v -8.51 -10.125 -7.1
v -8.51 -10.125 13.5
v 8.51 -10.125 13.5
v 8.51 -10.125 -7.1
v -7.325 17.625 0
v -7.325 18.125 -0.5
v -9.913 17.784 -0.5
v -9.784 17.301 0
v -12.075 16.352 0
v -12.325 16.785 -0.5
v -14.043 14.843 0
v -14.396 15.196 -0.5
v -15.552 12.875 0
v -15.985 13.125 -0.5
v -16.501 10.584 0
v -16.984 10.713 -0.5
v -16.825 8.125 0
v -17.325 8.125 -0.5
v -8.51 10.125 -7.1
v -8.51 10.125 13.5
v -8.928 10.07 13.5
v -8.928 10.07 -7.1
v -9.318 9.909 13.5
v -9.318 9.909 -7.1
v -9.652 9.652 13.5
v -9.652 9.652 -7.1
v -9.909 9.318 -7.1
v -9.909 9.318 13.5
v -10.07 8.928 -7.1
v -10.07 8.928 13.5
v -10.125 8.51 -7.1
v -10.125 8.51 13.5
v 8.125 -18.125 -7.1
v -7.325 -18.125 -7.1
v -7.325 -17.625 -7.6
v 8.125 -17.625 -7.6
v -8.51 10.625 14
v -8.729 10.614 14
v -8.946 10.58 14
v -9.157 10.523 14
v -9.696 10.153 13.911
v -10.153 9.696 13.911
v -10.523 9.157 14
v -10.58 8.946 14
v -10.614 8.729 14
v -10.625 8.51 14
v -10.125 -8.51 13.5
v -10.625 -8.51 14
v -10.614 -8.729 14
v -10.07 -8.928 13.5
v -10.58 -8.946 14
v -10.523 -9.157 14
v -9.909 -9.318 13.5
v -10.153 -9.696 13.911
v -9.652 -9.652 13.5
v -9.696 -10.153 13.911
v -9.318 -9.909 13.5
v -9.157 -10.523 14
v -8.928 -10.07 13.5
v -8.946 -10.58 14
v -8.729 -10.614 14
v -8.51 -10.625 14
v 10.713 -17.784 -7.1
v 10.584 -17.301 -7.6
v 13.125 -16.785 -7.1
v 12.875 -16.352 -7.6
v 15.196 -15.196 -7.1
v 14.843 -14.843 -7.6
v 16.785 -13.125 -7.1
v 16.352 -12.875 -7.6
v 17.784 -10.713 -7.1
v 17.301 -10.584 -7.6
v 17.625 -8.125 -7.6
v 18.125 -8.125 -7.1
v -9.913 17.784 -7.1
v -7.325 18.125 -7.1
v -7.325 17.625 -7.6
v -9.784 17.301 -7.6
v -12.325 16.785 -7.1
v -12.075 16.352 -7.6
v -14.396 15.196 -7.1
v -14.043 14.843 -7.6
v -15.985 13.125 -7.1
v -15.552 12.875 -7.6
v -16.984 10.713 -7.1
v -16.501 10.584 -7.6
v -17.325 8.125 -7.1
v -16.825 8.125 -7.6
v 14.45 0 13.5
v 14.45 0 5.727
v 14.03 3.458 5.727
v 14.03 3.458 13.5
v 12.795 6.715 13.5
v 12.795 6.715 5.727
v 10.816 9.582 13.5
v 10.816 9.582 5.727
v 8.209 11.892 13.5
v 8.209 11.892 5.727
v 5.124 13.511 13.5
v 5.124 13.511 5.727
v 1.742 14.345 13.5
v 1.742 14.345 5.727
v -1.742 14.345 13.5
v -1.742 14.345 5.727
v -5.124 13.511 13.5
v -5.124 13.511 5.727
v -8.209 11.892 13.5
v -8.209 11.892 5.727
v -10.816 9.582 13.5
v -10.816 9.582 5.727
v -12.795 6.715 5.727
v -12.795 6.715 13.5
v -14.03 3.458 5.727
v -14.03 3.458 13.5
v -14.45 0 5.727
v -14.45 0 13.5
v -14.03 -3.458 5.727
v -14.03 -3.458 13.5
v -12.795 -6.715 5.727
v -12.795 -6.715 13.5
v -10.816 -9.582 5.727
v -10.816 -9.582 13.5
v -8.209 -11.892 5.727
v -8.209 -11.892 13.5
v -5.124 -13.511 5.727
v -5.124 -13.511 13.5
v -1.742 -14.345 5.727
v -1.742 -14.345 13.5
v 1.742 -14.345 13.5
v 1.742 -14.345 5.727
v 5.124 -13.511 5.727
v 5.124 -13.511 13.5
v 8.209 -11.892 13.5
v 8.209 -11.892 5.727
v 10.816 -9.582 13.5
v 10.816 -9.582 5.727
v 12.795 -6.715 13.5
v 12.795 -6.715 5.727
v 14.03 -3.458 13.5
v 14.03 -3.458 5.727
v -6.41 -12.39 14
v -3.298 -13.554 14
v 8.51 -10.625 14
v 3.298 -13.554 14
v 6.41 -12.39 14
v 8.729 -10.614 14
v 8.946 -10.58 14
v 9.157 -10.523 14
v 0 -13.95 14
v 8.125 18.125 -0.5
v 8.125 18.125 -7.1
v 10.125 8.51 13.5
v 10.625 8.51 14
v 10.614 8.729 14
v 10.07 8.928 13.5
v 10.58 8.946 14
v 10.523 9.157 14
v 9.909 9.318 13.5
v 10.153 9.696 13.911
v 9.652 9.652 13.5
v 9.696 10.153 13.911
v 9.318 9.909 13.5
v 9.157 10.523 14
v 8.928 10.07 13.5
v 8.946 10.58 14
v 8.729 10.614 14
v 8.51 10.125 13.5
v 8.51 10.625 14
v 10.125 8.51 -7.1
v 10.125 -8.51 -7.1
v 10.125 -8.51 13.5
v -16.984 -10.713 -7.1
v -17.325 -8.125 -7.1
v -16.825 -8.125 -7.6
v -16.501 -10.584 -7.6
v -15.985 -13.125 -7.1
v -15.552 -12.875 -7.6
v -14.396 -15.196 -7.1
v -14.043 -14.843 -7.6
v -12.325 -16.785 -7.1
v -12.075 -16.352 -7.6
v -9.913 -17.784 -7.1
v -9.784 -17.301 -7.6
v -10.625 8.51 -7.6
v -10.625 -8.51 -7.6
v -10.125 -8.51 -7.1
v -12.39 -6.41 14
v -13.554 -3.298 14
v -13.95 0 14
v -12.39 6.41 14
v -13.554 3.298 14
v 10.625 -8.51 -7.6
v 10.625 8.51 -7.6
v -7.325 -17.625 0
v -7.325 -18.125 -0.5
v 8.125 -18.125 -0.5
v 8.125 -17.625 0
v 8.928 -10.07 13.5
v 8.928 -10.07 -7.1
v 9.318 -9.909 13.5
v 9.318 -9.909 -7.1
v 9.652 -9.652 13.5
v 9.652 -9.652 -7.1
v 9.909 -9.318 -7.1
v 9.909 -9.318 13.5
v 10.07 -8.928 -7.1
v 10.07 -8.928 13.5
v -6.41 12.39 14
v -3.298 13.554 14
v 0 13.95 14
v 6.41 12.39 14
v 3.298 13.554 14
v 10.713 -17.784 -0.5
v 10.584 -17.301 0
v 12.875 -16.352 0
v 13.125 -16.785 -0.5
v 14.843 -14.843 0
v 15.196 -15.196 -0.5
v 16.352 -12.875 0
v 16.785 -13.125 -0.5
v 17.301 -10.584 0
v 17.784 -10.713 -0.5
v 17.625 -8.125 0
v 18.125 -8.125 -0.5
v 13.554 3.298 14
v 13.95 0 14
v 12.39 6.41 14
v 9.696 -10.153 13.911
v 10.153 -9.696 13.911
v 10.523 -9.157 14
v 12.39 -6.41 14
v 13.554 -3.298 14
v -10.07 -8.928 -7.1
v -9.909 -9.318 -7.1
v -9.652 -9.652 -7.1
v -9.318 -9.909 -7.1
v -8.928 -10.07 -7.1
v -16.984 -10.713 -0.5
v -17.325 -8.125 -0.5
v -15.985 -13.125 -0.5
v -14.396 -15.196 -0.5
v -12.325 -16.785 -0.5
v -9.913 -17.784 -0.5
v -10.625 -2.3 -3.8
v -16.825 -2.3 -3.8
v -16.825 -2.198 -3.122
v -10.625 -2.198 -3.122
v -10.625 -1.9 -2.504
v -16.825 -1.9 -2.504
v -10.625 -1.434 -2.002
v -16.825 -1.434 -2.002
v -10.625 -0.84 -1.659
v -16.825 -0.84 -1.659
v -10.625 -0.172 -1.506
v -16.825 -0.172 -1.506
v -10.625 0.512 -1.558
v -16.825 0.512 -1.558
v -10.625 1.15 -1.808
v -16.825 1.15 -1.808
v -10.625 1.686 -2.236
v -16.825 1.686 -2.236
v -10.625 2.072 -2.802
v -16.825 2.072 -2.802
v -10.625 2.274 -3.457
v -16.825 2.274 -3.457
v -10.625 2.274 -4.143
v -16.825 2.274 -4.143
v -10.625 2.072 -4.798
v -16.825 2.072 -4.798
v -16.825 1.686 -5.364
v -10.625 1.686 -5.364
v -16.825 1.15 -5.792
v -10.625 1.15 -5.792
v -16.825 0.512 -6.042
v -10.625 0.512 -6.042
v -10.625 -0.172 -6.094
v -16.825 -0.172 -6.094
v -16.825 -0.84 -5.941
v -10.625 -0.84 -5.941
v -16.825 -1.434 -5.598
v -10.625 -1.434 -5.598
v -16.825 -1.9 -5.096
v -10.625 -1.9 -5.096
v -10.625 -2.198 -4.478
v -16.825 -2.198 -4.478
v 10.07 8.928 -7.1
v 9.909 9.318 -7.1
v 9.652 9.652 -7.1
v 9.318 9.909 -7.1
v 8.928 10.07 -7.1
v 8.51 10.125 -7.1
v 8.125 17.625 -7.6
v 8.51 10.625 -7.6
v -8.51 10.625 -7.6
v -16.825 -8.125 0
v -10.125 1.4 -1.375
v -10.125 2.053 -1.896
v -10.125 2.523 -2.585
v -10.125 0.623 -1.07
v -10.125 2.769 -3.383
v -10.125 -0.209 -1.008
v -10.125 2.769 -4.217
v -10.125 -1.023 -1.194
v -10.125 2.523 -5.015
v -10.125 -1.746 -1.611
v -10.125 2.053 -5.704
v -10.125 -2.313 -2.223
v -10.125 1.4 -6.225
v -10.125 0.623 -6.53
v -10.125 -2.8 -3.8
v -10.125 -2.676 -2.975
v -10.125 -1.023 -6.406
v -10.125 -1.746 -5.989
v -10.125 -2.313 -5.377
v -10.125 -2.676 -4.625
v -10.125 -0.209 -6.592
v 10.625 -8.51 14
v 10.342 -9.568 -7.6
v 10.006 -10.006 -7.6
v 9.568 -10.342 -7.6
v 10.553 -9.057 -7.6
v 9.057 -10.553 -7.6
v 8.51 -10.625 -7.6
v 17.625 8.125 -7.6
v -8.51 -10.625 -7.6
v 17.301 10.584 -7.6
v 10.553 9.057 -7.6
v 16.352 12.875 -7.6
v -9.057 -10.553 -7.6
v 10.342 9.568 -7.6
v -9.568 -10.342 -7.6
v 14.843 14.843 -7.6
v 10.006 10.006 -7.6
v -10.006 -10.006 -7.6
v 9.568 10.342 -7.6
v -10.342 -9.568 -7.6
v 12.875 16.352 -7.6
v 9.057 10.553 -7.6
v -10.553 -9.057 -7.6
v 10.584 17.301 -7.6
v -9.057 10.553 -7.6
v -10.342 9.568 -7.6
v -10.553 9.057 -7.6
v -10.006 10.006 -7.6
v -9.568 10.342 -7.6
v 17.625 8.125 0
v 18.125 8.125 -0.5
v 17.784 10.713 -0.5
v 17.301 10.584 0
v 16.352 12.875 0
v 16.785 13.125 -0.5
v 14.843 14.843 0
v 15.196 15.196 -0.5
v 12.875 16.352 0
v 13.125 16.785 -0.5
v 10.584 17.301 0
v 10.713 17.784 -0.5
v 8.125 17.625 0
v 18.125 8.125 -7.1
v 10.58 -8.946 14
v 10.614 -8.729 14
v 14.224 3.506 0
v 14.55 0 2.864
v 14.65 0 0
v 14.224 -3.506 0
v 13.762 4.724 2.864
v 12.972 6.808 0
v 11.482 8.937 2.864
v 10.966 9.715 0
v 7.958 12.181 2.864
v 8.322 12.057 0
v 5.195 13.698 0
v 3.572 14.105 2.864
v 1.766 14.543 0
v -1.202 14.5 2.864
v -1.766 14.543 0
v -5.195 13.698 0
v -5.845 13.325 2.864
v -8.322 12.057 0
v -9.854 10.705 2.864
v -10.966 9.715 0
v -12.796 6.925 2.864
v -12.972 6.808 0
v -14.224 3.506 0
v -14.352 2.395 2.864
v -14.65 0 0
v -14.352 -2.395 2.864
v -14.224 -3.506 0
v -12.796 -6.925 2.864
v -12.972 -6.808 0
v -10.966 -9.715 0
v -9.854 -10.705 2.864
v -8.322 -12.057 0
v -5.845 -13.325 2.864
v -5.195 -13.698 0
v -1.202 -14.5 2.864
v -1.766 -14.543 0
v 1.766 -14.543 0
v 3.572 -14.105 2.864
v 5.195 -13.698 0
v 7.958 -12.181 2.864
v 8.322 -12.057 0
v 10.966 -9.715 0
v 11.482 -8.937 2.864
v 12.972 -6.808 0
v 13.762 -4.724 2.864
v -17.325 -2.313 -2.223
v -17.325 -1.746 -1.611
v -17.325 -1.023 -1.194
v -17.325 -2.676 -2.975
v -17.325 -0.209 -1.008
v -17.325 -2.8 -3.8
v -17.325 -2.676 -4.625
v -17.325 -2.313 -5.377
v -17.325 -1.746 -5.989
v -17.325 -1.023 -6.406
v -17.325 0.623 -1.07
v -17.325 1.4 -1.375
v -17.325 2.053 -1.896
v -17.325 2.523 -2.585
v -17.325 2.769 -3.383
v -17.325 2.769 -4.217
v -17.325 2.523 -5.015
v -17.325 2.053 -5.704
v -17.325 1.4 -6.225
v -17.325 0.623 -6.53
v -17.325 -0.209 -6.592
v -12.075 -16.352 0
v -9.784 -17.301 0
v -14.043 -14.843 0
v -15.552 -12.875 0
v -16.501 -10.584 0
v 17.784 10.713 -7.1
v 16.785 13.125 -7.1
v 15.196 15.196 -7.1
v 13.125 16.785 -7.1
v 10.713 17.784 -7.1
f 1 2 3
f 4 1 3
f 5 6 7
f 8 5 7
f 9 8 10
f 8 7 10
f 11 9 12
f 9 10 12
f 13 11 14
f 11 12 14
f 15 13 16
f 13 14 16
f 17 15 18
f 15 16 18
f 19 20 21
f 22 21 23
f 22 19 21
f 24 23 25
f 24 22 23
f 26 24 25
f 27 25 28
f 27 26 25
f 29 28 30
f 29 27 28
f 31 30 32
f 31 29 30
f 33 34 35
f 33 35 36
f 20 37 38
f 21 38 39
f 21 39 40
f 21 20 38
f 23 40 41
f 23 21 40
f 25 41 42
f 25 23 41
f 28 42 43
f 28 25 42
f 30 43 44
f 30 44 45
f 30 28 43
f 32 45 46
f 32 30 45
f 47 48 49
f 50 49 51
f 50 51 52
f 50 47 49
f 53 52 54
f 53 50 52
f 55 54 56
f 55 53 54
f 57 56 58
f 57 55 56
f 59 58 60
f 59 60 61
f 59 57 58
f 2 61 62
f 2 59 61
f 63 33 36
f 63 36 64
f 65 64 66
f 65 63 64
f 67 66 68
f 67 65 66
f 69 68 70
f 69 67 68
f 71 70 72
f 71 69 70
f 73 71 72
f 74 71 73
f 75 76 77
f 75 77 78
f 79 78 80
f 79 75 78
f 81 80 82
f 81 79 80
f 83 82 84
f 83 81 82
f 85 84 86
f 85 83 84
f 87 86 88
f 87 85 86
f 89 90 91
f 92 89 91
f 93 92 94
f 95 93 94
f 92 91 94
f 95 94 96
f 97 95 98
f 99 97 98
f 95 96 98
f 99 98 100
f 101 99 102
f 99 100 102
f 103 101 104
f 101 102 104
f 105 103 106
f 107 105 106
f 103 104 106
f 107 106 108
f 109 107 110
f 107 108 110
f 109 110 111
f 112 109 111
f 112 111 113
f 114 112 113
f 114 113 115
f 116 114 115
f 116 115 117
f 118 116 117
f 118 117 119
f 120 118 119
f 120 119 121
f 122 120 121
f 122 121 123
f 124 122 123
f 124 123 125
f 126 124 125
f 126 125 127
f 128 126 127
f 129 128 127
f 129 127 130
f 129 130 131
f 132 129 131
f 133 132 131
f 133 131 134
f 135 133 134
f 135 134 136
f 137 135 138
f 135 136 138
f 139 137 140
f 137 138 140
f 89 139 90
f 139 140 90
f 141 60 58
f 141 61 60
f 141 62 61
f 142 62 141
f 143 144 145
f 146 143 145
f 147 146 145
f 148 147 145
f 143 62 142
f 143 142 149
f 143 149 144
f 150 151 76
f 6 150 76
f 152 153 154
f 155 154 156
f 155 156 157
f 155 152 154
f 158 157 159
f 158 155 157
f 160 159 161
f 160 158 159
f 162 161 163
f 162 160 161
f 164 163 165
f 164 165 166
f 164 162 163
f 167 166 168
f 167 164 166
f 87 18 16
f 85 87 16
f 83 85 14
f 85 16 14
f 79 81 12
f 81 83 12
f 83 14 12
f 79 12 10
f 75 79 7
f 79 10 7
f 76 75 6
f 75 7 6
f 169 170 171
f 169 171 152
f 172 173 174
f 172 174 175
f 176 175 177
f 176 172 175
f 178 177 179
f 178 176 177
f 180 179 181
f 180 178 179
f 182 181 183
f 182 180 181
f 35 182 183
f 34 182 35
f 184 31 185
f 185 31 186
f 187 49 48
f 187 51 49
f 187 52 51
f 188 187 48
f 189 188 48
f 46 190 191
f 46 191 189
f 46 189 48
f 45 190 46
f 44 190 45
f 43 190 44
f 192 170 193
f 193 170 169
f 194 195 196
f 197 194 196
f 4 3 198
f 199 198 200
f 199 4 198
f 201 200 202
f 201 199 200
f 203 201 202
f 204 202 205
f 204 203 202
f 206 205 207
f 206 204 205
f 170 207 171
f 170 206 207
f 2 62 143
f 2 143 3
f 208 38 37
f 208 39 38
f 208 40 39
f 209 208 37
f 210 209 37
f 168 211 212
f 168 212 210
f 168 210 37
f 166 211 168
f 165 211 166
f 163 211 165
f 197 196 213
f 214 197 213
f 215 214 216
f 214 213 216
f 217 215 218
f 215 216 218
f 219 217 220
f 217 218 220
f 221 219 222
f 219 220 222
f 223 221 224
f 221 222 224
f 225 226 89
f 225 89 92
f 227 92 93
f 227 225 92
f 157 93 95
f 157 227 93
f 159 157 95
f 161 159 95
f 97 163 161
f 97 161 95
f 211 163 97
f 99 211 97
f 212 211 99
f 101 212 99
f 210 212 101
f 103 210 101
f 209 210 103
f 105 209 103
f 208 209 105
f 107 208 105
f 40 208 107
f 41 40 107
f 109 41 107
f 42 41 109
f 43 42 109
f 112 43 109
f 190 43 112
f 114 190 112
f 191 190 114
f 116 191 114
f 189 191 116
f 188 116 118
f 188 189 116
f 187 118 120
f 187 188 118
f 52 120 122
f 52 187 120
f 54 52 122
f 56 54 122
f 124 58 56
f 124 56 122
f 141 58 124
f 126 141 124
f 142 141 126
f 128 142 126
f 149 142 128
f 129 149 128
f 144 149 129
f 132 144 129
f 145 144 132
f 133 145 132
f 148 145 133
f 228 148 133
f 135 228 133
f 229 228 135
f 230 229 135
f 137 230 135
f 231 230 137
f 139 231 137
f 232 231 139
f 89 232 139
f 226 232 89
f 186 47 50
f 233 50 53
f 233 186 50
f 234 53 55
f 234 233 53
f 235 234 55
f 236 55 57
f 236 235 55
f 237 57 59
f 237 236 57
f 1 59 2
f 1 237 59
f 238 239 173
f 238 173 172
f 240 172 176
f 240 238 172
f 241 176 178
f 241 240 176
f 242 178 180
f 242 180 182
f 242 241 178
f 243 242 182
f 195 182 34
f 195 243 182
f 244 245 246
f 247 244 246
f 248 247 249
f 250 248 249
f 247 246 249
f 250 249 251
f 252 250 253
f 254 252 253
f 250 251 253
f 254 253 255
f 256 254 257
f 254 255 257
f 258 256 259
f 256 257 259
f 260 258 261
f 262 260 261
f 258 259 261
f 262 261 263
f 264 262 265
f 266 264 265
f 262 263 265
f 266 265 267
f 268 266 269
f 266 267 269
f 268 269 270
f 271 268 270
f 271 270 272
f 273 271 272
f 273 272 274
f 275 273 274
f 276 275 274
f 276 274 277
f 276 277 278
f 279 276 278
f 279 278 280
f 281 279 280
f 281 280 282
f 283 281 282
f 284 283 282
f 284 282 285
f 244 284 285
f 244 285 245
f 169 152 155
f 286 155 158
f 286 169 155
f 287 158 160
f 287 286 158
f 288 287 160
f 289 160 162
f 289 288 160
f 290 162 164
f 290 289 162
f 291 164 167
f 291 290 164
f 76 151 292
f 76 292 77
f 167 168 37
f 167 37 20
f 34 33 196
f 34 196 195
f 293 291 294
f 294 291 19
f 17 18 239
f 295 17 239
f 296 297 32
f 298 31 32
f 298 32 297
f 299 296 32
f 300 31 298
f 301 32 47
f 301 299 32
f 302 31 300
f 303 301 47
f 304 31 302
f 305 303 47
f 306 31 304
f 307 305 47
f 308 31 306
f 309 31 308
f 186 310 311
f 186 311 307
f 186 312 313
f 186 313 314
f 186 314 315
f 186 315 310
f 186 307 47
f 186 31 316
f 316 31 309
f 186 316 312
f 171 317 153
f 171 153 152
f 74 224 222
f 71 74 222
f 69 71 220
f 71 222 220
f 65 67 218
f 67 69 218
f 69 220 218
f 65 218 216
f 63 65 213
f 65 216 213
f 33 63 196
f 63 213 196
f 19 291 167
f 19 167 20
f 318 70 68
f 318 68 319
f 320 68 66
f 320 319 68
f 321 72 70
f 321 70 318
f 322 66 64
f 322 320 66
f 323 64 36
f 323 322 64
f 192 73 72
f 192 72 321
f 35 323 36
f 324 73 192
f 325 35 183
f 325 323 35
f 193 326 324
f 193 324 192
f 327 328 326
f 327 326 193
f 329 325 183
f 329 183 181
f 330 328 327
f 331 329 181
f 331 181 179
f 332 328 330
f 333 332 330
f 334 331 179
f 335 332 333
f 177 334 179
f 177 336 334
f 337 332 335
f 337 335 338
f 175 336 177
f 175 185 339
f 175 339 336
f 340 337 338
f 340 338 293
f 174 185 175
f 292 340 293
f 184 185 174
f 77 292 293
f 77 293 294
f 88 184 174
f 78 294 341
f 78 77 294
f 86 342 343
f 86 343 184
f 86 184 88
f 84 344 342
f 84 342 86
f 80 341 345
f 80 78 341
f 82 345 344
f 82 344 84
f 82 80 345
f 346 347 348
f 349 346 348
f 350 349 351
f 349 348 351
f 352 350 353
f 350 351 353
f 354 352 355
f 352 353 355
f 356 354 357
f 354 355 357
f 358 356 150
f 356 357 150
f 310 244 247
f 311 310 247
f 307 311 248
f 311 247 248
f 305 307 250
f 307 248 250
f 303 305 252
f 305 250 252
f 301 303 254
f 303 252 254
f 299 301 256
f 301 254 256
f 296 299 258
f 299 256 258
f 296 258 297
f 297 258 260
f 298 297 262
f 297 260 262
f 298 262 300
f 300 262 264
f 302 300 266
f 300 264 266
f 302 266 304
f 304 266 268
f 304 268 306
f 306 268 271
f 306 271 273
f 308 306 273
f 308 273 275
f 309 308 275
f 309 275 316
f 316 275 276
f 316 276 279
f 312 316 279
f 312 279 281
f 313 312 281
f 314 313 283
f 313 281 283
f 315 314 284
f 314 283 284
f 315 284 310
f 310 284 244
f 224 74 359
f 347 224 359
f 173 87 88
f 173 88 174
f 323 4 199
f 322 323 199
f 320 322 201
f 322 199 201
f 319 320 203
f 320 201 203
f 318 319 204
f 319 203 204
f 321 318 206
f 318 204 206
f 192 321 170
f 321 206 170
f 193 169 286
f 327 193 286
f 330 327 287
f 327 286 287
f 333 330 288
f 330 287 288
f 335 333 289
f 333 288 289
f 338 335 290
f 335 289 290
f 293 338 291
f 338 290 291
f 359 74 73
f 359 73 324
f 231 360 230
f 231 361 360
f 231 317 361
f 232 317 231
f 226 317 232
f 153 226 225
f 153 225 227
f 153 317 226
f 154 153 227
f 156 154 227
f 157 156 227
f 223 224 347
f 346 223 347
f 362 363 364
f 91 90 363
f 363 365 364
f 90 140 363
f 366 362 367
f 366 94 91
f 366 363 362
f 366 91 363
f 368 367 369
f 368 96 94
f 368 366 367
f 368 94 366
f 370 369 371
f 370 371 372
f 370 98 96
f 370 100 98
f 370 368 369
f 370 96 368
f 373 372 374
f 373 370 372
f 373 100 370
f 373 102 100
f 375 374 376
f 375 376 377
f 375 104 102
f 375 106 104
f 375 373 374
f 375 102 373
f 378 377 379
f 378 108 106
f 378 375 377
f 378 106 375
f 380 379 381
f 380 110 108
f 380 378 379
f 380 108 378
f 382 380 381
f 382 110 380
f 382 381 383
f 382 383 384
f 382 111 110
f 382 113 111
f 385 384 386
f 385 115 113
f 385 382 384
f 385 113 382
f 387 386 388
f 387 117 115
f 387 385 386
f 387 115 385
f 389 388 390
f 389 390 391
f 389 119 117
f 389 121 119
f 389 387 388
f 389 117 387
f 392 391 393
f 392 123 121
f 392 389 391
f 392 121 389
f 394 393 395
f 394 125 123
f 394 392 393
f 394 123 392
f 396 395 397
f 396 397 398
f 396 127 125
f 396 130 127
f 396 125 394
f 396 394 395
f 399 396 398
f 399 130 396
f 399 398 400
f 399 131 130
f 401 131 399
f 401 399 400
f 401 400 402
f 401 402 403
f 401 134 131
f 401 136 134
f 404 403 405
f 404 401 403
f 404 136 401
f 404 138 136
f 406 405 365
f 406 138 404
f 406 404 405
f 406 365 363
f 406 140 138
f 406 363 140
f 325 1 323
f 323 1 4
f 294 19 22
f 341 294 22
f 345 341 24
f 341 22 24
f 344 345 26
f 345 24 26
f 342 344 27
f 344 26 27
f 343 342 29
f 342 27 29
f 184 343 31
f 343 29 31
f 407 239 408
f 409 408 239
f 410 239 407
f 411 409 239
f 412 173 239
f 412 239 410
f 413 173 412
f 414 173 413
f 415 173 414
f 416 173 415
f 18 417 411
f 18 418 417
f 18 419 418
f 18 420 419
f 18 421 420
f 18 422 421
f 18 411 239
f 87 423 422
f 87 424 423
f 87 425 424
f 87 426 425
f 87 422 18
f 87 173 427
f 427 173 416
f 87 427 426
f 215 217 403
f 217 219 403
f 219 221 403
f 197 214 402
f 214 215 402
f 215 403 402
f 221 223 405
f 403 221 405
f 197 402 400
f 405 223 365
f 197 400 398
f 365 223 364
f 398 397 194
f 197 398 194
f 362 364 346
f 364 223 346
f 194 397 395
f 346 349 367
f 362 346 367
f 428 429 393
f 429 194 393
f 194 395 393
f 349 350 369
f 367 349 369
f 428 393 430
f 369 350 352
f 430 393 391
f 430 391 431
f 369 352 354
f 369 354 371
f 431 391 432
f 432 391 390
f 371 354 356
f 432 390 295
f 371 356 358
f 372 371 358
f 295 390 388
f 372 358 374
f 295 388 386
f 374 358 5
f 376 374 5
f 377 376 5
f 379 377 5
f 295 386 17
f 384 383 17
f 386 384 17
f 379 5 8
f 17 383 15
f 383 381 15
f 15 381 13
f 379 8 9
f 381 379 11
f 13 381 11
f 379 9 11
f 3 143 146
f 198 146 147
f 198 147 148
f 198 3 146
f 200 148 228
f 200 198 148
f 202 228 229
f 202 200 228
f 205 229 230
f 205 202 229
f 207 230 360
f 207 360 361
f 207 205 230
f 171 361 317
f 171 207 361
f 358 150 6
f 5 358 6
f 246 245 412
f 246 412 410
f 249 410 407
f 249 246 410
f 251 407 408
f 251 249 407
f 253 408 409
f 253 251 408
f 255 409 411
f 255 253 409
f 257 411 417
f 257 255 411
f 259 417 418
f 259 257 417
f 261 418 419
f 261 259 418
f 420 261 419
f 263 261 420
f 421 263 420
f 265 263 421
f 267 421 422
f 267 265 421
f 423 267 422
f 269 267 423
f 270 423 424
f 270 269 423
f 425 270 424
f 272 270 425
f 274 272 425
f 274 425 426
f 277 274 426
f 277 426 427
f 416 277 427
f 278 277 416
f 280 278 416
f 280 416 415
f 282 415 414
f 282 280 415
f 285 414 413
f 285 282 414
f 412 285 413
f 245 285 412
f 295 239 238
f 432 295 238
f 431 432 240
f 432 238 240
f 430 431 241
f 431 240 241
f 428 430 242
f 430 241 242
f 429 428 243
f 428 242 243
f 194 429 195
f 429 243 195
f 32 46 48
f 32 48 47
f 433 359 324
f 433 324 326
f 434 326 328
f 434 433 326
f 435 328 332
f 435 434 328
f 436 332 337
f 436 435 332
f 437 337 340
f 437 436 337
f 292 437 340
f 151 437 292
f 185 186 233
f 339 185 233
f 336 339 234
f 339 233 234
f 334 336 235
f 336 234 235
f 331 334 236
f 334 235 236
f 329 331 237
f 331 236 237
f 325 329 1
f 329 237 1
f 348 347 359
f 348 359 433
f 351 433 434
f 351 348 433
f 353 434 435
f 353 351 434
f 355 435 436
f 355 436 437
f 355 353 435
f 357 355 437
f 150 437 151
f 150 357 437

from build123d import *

# Parameters (mm, degrees)
SKETCH1_R           = 14.45
BOSS_EXTRUDE1_DEPTH = 14
BOSS_EXTRUDE2_START = 7.6
SKETCH2_W           = 35.45
SKETCH2_H           = 36.25
BOSS_EXTRUDE2_DEPTH = 7.6
FILLET1_R           = 10
CUT_EXTRUDE1_REACH  = 44.204
SKETCH3_R           = 2.3
CHAMFER1_SIZE       = 0.5
CHAMFER2_SIZE       = 0.2
CHAMFER2_SIZE2      = 5.727250657
CHAMFER3_SIZE       = 0.5


with BuildPart() as part:
    # Sketch1 → Boss-Extrude1 (new body)
    with BuildSketch(Plane.XY):
        Circle(SKETCH1_R)
        with BuildLine():
            Line((-8.510102807, -10.125), (8.510102807, -10.125))
            ThreePointArc((8.510102807, -10.125), (9.652007563, -9.652007563), (10.125, -8.510102807))
            Line((10.125, -8.510102807), (10.125, 8.510102807))
            ThreePointArc((10.125, 8.510102807), (9.652007563, 9.652007563), (8.510102807, 10.125))
            Line((8.510102807, 10.125), (-8.510102807, 10.125))
            ThreePointArc((-8.510102807, 10.125), (-9.652007563, 9.652007563), (-10.125, 8.510102807))
            Line((-10.125, 8.510102807), (-10.125, -8.510102807))
            ThreePointArc((-10.125, -8.510102807), (-9.652007563, -9.652007563), (-8.510102807, -10.125))
        make_face(mode=Mode.SUBTRACT)
    extrude(amount=BOSS_EXTRUDE1_DEPTH)

    # Sketch2 → Boss-Extrude2 (add)
    with BuildSketch(Plane(origin=(0, 0, 0), x_dir=(-1, 0, 0), z_dir=(0, 0, -1)).offset(BOSS_EXTRUDE2_START)):
        with Locations((-0.4, 0)):
            Rectangle(SKETCH2_W, SKETCH2_H)
        with BuildLine():
            Line((8.510102807, -10.125), (-8.510102807, -10.125))
            ThreePointArc((-8.510102807, -10.125), (-9.652007563, -9.652007563), (-10.125, -8.510102807))
            Line((-10.125, -8.510102807), (-10.125, 8.510102807))
            ThreePointArc((-10.125, 8.510102807), (-9.652007563, 9.652007563), (-8.510102807, 10.125))
            Line((-8.510102807, 10.125), (8.510102807, 10.125))
            ThreePointArc((8.510102807, 10.125), (9.652007563, 9.652007563), (10.125, 8.510102807))
            Line((10.125, 8.510102807), (10.125, -8.510102807))
            ThreePointArc((10.125, -8.510102807), (9.652007563, -9.652007563), (8.510102807, -10.125))
        make_face(mode=Mode.SUBTRACT)
    extrude(amount=-BOSS_EXTRUDE2_DEPTH)

    # Fillet1
    fillet1_edges = [part.edges().sort_by_distance(p)[0] for p in [
        (18.125, 18.125, -3.8),
        (18.125, -18.125, -3.8),
        (-17.325, -18.125, -3.8),
        (-17.325, 18.125, -3.8),
    ]]
    fillet(fillet1_edges, radius=FILLET1_R)

    # Sketch3 → Cut-Extrude1 (cut, up to next)
    with BuildSketch(Plane.ZY.offset(17.325), mode=Mode.PRIVATE) as cut_extrude1_sk1:
        with Locations(Location((-3.8, 0, 0), (0, 0, 270))):
            Circle(SKETCH3_R)
    cut_extrude1_tool1 = extrude(cut_extrude1_sk1.sketch, amount=-CUT_EXTRUDE1_REACH, mode=Mode.PRIVATE) & part.part
    add(cut_extrude1_tool1.solids().sort_by_distance((-17.325, 0, -3.8))[0], mode=Mode.SUBTRACT)

    # Chamfer1
    chamfer1_edges = [part.edges().sort_by_distance(p)[0] for p in [
        (-9.652007563, 9.652007563, -7.6),
        (0, 10.125, -7.6),
        (9.652007563, 9.652007563, -7.6),
        (10.125, 0, -7.6),
        (9.652007563, -9.652007563, -7.6),
        (0, -10.125, -7.6),
        (-9.652007563, -9.652007563, -7.6),
        (-10.125, 0, -7.6),
        (0.4, 18.125, 0),
        (0.4, 18.125, -7.6),
        (18.125, 0, 0),
        (-17.325, 0, 0),
        (0.4, -18.125, 0),
        (-14.396067812, -15.196067812, 0),
        (15.196067812, -15.196067812, 0),
        (15.196067812, 15.196067812, 0),
        (-14.396067812, 15.196067812, 0),
        (-17.325, 0, -7.6),
        (18.125, 0, -7.6),
        (0.4, -18.125, -7.6),
        (-14.396067812, -15.196067812, -7.6),
        (15.196067812, -15.196067812, -7.6),
        (15.196067812, 15.196067812, -7.6),
        (-14.396067812, 15.196067812, -7.6),
        (-10.125, 2.3, -3.8),
        (-17.325, 2.3, -3.8),
    ]]
    chamfer(chamfer1_edges, length=CHAMFER1_SIZE)

    # Chamfer2
    chamfer2_edges = [part.edges().sort_by_distance(p)[0] for p in [
        (-14.45, 0, 0),
    ]]
    chamfer2_side = [part.faces().sort_by_distance(p)[0] for p in [
        (0.4, 17.132114111, 0),
    ]]
    chamfer(chamfer2_edges, length=CHAMFER2_SIZE, length2=CHAMFER2_SIZE2, reference=chamfer2_side[0])

    # Chamfer3
    # the kernel refuses this chamfer: 0.5 mm, written as the material it takes off along each edge
    with BuildSketch(Plane(origin=(8.510102807, -8.510102807, 14), x_dir=(0, -1, 0), z_dir=(-1, 0, 0))) as chamfer3_piece_1:
        Polygon((1.614897193 + CHAMFER3_SIZE, 0), (1.614897193, -CHAMFER3_SIZE), (1.614897193, 0), align=None)
    revolve(axis=Axis((8.510102807, -8.510102807, 14), (0, 0, 1)), revolution_arc=90, mode=Mode.SUBTRACT)
    with BuildSketch(Plane(origin=(10.125, -8.510102807, 14), x_dir=(0.9996219169112968, 2.0865614307067877e-15, 0.027495876610585647), z_dir=(0, 1, 0)), Plane(origin=(8.510102807, 10.125, 14), x_dir=(-1.877905287636107e-15, 0.9996219169112968, 0.027495876610585647), z_dir=(-1, 0, 0)), Plane(origin=(-10.125, 8.510102807, 14), x_dir=(-0.9996219169112968, 0, 0.027495876610585647), z_dir=(0, -1, 0)), Plane(origin=(-8.510102807, -10.125, 14), x_dir=(0, -0.9996219169112968, 0.027495876610585647), z_dir=(1, 0, 0))) as chamfer3_piece_2:
        Polygon((CHAMFER3_SIZE * 0.999621916911, CHAMFER3_SIZE * 0.0274958766106), (-CHAMFER3_SIZE * 0.0274958766106, CHAMFER3_SIZE * 0.999621916911), (0, 0), align=None)
    extrude(amount=17.020205615, mode=Mode.SUBTRACT)
    with BuildSketch(Plane(origin=(8.510102807, 8.510102807, 14), x_dir=(1, 0, 0), z_dir=(0, -1, 0))) as chamfer3_piece_3:
        Polygon((1.614897193 + CHAMFER3_SIZE, 0), (1.614897193, -CHAMFER3_SIZE), (1.614897193, 0), align=None)
    revolve(axis=Axis((8.510102807, 8.510102807, 14), (0, 0, 1)), revolution_arc=90, mode=Mode.SUBTRACT)
    with BuildSketch(Plane(origin=(-8.510102807, 8.510102807, 14), x_dir=(0, 1, 0), z_dir=(1, 0, 0))) as chamfer3_piece_4:
        Polygon((1.614897193 + CHAMFER3_SIZE, 0), (1.614897193, -CHAMFER3_SIZE), (1.614897193, 0), align=None)
    revolve(axis=Axis((-8.510102807, 8.510102807, 14), (0, 0, 1)), revolution_arc=90, mode=Mode.SUBTRACT)
    with BuildSketch(Plane(origin=(-8.510102807, -8.510102807, 14), x_dir=(-1, 0, 0), z_dir=(0, 1, 0))) as chamfer3_piece_5:
        Polygon((1.614897193 + CHAMFER3_SIZE, 0), (1.614897193, -CHAMFER3_SIZE), (1.614897193, 0), align=None)
    revolve(axis=Axis((-8.510102807, -8.510102807, 14), (0, 0, 1)), revolution_arc=90, mode=Mode.SUBTRACT)
    with BuildSketch(Plane(origin=(0, 0, 14), x_dir=(1, 0, 0), z_dir=(0, -1, 0))) as chamfer3_piece_6:
        Polygon((14.45, -CHAMFER3_SIZE), (14.45 - CHAMFER3_SIZE, 0), (14.45, 0), align=None)
    revolve(axis=Axis((0, 0, 14), (0, 0, 1)), mode=Mode.SUBTRACT)


solid = part.part
